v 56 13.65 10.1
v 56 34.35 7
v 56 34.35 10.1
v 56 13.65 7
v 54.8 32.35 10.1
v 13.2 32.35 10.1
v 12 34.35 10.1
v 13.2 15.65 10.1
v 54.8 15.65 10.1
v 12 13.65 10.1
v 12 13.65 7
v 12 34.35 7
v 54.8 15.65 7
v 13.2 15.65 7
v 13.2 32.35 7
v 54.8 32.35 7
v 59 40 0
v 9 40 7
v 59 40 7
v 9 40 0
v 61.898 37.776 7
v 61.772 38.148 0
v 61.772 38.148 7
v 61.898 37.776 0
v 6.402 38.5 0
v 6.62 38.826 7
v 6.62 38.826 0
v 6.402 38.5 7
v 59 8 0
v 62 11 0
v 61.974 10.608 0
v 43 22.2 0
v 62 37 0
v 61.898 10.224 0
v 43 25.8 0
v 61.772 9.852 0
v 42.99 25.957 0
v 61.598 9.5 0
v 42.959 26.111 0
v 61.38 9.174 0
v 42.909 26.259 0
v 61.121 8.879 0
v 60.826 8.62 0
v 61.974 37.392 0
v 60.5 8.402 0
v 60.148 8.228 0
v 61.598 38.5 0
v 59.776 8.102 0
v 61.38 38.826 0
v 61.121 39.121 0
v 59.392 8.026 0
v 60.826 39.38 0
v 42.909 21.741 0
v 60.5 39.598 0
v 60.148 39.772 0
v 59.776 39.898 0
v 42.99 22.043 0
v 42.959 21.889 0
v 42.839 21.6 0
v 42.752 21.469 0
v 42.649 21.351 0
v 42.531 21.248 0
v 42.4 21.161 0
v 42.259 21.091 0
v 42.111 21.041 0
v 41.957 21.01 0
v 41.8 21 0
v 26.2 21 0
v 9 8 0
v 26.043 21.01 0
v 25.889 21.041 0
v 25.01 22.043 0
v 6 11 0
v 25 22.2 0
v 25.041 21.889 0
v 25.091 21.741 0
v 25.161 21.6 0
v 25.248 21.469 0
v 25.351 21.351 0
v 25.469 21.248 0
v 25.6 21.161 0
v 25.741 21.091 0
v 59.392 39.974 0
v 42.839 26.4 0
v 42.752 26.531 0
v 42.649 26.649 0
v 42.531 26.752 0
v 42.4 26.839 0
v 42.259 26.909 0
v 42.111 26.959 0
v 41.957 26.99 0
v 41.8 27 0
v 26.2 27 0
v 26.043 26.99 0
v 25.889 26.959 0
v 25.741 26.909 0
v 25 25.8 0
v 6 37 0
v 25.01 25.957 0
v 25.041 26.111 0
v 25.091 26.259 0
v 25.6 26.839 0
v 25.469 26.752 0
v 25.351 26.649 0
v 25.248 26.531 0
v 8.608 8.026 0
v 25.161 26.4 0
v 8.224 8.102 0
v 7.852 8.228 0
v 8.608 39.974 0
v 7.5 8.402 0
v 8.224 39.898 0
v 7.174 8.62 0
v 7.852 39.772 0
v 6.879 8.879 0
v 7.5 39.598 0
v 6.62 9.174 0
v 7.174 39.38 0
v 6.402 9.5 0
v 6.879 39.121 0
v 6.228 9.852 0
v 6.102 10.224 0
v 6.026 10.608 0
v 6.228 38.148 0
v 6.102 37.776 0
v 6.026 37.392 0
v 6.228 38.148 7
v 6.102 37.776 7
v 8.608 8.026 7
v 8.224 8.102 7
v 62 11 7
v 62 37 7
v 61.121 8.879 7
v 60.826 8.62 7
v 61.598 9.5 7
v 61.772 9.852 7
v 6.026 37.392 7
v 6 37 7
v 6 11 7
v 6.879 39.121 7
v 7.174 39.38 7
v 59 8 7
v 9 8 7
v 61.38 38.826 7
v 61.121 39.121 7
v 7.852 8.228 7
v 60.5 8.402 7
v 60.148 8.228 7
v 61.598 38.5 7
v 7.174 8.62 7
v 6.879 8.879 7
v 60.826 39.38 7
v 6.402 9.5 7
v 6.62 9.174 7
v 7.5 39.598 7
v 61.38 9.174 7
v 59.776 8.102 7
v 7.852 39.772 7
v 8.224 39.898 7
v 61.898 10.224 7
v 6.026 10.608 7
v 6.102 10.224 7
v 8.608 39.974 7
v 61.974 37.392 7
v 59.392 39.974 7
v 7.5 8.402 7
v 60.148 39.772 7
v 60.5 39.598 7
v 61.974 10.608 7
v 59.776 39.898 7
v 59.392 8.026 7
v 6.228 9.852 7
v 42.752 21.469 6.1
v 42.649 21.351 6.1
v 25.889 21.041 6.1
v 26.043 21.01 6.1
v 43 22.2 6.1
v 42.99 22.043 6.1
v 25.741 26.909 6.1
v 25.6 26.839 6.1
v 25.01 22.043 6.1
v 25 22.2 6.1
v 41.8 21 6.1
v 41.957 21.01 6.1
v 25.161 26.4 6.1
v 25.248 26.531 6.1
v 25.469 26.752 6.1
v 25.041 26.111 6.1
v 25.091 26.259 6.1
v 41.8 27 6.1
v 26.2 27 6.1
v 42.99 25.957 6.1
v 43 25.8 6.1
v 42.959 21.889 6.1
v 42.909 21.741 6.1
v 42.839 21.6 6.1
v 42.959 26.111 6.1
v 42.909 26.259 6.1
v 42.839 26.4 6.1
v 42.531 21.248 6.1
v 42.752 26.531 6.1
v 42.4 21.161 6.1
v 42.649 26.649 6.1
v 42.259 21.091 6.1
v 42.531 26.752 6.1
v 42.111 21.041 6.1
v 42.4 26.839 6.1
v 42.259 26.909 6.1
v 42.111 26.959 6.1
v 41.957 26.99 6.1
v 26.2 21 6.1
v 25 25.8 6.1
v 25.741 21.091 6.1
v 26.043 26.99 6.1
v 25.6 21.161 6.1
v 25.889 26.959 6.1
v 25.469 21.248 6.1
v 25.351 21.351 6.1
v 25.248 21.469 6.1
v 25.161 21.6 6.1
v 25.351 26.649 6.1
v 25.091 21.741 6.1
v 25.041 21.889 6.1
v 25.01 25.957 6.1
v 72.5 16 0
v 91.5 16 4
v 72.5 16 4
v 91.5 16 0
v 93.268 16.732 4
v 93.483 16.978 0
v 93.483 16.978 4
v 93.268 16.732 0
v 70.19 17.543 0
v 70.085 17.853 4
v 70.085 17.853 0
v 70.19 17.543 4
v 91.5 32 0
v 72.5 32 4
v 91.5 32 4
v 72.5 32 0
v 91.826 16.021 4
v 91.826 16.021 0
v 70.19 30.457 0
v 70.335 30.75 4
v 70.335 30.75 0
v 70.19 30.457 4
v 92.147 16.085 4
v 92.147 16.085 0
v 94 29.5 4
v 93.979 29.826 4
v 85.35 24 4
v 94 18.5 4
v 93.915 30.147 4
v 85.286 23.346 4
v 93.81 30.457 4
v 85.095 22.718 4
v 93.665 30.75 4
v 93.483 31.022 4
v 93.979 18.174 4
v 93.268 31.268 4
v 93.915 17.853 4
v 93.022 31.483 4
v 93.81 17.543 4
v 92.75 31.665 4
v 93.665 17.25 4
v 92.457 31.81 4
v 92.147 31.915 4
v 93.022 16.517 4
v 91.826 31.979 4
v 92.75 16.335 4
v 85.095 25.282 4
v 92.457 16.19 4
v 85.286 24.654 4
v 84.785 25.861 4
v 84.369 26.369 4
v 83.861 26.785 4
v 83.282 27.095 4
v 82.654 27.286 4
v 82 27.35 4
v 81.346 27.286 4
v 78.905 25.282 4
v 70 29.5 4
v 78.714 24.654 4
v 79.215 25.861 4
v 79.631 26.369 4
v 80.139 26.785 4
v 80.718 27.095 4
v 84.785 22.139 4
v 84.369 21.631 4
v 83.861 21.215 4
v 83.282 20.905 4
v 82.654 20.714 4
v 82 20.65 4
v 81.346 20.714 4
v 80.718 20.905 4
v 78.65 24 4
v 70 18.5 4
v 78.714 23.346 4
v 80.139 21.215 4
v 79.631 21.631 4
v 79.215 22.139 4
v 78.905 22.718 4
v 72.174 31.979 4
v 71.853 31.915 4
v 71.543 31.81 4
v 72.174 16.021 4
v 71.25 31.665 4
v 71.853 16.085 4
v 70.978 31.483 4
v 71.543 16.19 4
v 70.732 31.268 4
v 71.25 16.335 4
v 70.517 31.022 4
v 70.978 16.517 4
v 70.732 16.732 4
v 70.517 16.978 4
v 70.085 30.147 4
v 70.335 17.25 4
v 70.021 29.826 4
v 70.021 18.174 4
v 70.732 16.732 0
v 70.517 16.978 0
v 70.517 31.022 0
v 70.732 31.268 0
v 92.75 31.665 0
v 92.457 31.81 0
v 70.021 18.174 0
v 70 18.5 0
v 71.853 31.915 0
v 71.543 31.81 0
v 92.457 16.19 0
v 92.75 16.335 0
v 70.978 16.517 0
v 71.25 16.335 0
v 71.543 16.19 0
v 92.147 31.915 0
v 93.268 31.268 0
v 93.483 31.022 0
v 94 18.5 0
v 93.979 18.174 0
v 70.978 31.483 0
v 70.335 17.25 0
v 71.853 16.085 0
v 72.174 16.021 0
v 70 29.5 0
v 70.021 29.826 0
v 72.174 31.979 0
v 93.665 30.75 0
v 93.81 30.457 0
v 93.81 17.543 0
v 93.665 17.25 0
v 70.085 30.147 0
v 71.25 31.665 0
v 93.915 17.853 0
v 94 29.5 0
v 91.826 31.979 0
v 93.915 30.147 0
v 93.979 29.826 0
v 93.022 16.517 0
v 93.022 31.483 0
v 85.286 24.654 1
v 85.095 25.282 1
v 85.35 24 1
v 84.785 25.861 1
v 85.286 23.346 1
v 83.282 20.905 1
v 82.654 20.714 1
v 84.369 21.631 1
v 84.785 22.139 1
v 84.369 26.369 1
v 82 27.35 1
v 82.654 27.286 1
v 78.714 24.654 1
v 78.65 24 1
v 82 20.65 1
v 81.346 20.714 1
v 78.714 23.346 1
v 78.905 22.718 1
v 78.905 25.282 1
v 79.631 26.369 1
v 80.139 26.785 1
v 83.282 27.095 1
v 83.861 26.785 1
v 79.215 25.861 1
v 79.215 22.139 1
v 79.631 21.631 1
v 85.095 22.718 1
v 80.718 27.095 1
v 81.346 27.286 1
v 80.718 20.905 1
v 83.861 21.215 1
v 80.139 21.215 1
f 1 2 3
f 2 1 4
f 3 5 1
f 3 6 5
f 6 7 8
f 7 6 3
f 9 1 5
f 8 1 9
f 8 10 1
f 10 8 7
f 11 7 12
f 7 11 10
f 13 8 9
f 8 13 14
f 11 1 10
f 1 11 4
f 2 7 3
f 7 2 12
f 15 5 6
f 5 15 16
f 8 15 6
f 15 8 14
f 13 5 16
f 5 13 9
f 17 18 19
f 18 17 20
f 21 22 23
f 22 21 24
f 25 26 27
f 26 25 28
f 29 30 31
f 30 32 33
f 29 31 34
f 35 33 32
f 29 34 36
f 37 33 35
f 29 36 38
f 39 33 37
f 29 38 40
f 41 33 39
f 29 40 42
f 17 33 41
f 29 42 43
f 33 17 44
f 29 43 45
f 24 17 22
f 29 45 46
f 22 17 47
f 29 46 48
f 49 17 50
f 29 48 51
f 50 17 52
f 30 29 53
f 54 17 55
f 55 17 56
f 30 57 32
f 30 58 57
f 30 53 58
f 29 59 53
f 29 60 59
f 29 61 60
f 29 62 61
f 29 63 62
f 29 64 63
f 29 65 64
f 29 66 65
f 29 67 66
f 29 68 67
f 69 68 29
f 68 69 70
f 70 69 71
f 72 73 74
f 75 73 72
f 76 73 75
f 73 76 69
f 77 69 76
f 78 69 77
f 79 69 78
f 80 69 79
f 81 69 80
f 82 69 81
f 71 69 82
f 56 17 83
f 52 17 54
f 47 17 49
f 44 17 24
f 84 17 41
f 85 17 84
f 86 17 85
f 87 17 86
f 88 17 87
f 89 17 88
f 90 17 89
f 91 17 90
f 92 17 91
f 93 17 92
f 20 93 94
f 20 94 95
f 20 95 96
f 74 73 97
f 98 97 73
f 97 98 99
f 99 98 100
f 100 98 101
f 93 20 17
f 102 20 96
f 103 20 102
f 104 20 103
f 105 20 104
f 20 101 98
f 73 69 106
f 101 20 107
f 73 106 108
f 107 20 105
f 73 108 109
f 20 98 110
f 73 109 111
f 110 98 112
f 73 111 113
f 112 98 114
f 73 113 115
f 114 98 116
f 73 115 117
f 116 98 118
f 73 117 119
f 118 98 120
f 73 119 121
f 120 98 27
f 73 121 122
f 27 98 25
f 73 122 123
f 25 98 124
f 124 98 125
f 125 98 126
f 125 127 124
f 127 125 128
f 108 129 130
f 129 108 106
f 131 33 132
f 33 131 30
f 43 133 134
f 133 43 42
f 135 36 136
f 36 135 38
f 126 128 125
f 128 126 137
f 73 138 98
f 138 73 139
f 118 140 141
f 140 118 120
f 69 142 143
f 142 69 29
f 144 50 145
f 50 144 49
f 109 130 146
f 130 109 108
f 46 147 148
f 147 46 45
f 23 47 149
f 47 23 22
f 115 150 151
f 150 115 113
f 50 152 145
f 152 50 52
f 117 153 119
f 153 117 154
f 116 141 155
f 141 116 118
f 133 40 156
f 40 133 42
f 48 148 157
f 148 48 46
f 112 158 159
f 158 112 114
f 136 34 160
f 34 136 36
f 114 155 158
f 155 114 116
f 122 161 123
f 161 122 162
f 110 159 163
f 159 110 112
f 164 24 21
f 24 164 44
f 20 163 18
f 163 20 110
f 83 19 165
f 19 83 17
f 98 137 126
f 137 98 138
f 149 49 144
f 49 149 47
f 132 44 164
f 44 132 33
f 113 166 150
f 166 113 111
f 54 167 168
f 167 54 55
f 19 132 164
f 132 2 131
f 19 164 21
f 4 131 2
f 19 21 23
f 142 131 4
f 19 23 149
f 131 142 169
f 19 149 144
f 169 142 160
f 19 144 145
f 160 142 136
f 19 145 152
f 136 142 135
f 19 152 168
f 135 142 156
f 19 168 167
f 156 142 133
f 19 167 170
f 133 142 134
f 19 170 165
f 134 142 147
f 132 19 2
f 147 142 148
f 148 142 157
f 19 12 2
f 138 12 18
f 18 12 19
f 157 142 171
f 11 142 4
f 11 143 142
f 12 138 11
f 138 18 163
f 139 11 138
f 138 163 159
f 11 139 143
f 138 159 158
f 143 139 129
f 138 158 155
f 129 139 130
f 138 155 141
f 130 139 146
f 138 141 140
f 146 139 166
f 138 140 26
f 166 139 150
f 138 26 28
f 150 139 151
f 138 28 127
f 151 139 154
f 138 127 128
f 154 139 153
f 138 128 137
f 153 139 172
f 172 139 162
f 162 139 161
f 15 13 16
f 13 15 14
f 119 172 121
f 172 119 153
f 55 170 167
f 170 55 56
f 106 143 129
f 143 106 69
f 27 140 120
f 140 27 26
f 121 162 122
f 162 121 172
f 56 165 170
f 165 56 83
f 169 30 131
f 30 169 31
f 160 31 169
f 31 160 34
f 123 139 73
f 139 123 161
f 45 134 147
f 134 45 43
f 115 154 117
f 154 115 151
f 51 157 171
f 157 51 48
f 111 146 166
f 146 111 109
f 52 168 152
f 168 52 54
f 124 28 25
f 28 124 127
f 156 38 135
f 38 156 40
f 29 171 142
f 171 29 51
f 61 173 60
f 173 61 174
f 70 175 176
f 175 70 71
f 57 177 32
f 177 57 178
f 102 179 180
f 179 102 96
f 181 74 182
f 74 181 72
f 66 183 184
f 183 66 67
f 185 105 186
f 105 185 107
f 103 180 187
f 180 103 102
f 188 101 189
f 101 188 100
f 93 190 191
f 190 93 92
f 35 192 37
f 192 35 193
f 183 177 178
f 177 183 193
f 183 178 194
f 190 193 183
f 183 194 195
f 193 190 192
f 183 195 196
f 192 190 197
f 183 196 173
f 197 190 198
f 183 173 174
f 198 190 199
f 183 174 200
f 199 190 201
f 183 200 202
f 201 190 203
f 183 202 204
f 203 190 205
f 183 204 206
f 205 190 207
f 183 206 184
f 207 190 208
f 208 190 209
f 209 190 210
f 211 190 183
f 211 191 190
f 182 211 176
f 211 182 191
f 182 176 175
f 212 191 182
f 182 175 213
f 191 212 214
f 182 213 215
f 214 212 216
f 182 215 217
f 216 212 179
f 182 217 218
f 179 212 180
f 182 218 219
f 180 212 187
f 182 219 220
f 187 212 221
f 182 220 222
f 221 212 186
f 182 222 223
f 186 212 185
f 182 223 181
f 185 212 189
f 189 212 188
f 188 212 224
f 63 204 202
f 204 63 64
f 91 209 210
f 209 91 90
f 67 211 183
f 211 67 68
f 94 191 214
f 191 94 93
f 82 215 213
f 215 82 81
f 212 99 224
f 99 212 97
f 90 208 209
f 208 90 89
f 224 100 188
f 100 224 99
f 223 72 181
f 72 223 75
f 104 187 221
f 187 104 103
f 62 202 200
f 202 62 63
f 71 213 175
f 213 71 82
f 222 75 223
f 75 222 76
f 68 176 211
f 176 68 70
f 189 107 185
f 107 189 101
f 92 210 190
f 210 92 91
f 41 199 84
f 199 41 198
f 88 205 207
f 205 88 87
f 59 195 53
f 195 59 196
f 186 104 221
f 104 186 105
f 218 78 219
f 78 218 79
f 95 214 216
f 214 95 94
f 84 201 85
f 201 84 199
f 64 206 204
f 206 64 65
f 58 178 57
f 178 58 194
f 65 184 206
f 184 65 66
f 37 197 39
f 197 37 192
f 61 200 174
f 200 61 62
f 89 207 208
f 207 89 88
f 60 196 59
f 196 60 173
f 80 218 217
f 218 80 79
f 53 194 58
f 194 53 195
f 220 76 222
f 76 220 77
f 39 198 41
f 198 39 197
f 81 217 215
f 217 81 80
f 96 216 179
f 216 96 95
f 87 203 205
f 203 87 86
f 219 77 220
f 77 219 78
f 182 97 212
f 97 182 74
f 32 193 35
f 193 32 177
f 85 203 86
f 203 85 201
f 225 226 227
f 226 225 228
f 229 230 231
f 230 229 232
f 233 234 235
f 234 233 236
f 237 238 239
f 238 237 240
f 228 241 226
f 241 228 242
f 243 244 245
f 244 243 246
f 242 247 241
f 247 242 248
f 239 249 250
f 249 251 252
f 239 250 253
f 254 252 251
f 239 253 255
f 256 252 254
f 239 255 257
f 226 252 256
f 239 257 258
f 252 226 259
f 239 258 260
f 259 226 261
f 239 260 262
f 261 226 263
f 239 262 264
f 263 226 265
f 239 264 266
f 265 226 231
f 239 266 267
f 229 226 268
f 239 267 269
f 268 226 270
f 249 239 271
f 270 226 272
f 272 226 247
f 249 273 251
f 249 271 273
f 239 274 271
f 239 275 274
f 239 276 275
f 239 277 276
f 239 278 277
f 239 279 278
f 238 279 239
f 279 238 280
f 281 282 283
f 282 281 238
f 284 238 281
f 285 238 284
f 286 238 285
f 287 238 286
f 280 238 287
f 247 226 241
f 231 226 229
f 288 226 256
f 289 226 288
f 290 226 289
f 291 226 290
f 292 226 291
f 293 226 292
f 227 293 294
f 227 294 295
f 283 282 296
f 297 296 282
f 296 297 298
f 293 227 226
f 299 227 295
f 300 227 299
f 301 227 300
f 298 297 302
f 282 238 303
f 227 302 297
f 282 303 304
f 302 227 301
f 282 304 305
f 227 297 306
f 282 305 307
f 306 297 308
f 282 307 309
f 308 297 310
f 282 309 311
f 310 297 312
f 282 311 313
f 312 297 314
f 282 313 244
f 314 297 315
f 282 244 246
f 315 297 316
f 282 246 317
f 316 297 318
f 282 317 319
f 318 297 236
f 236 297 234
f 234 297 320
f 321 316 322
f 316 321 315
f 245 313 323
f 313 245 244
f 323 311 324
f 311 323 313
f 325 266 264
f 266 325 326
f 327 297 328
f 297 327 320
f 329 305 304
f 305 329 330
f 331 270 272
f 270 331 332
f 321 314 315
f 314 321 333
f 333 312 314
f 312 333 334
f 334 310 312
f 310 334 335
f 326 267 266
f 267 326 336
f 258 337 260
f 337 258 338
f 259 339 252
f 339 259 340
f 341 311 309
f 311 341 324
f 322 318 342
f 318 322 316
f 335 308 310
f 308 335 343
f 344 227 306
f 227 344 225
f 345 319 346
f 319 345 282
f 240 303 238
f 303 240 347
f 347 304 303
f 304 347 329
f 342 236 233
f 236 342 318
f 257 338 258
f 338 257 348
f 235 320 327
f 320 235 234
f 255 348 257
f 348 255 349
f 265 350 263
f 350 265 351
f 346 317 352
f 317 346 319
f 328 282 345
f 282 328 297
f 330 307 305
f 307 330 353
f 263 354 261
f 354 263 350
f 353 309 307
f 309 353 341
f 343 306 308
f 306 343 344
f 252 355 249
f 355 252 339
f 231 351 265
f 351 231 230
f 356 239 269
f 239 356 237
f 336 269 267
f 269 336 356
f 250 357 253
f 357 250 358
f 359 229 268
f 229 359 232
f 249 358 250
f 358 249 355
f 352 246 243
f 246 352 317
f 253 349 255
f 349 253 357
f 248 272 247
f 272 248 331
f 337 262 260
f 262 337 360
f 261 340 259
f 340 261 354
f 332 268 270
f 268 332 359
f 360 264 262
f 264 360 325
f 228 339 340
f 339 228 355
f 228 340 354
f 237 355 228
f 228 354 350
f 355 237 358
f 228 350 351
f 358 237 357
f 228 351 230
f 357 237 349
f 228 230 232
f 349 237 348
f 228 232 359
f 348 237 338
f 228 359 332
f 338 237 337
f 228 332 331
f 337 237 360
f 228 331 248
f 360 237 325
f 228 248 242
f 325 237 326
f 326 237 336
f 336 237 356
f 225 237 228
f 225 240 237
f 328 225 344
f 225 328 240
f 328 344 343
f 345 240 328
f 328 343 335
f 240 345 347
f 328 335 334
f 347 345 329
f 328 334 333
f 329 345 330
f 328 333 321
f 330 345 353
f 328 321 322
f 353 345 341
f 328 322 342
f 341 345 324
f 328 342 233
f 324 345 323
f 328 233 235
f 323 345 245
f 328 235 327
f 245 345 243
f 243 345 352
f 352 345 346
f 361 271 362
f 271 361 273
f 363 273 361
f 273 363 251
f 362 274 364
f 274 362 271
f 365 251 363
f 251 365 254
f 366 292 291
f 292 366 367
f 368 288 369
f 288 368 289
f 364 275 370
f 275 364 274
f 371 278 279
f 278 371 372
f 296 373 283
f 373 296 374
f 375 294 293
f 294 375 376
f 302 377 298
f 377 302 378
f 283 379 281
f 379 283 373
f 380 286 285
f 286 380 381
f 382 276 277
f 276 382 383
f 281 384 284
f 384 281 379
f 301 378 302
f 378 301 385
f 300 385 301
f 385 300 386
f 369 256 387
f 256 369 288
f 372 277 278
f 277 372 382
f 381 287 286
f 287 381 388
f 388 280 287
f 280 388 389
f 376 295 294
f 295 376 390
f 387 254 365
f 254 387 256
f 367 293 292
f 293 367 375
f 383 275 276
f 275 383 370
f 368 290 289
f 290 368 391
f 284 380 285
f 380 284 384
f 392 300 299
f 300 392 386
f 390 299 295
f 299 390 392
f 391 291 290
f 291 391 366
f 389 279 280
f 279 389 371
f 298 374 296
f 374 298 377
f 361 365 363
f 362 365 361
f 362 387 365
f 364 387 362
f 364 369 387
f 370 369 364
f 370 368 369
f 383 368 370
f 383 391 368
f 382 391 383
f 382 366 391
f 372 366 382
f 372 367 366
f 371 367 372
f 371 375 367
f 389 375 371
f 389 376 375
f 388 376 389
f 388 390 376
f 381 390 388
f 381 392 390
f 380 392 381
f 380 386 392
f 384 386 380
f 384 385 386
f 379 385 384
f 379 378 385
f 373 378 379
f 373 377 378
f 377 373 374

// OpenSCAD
/*
Sample 153: Abgedichtete Magnetbetätiger-Tasche — Wand 1 mm
Generated from the FDM Mechanical Sample Library.
Units: millimetres.

Override examples:
  openscad -o custom.stl -D 'view="plate"' -D 'render_fn=64' model.scad
  openscad -o preview.png -D 'view="assembly"' model.scad
*/
use <../../../library/fdm_mechanisms.scad>

render_fn = is_undef(render_fn) ? 48 : render_fn;
view = is_undef(view) ? "plate" : view;
$fn = render_fn;

sample_magnetic_actuator(
    view=view,
    wall_t=1,
    magnet_d=6,
    magnet_l=3,
    switch_keepout=[18, 6, 6],
    travel=20,
    retention=1.2,
    clearance=0.35
);
